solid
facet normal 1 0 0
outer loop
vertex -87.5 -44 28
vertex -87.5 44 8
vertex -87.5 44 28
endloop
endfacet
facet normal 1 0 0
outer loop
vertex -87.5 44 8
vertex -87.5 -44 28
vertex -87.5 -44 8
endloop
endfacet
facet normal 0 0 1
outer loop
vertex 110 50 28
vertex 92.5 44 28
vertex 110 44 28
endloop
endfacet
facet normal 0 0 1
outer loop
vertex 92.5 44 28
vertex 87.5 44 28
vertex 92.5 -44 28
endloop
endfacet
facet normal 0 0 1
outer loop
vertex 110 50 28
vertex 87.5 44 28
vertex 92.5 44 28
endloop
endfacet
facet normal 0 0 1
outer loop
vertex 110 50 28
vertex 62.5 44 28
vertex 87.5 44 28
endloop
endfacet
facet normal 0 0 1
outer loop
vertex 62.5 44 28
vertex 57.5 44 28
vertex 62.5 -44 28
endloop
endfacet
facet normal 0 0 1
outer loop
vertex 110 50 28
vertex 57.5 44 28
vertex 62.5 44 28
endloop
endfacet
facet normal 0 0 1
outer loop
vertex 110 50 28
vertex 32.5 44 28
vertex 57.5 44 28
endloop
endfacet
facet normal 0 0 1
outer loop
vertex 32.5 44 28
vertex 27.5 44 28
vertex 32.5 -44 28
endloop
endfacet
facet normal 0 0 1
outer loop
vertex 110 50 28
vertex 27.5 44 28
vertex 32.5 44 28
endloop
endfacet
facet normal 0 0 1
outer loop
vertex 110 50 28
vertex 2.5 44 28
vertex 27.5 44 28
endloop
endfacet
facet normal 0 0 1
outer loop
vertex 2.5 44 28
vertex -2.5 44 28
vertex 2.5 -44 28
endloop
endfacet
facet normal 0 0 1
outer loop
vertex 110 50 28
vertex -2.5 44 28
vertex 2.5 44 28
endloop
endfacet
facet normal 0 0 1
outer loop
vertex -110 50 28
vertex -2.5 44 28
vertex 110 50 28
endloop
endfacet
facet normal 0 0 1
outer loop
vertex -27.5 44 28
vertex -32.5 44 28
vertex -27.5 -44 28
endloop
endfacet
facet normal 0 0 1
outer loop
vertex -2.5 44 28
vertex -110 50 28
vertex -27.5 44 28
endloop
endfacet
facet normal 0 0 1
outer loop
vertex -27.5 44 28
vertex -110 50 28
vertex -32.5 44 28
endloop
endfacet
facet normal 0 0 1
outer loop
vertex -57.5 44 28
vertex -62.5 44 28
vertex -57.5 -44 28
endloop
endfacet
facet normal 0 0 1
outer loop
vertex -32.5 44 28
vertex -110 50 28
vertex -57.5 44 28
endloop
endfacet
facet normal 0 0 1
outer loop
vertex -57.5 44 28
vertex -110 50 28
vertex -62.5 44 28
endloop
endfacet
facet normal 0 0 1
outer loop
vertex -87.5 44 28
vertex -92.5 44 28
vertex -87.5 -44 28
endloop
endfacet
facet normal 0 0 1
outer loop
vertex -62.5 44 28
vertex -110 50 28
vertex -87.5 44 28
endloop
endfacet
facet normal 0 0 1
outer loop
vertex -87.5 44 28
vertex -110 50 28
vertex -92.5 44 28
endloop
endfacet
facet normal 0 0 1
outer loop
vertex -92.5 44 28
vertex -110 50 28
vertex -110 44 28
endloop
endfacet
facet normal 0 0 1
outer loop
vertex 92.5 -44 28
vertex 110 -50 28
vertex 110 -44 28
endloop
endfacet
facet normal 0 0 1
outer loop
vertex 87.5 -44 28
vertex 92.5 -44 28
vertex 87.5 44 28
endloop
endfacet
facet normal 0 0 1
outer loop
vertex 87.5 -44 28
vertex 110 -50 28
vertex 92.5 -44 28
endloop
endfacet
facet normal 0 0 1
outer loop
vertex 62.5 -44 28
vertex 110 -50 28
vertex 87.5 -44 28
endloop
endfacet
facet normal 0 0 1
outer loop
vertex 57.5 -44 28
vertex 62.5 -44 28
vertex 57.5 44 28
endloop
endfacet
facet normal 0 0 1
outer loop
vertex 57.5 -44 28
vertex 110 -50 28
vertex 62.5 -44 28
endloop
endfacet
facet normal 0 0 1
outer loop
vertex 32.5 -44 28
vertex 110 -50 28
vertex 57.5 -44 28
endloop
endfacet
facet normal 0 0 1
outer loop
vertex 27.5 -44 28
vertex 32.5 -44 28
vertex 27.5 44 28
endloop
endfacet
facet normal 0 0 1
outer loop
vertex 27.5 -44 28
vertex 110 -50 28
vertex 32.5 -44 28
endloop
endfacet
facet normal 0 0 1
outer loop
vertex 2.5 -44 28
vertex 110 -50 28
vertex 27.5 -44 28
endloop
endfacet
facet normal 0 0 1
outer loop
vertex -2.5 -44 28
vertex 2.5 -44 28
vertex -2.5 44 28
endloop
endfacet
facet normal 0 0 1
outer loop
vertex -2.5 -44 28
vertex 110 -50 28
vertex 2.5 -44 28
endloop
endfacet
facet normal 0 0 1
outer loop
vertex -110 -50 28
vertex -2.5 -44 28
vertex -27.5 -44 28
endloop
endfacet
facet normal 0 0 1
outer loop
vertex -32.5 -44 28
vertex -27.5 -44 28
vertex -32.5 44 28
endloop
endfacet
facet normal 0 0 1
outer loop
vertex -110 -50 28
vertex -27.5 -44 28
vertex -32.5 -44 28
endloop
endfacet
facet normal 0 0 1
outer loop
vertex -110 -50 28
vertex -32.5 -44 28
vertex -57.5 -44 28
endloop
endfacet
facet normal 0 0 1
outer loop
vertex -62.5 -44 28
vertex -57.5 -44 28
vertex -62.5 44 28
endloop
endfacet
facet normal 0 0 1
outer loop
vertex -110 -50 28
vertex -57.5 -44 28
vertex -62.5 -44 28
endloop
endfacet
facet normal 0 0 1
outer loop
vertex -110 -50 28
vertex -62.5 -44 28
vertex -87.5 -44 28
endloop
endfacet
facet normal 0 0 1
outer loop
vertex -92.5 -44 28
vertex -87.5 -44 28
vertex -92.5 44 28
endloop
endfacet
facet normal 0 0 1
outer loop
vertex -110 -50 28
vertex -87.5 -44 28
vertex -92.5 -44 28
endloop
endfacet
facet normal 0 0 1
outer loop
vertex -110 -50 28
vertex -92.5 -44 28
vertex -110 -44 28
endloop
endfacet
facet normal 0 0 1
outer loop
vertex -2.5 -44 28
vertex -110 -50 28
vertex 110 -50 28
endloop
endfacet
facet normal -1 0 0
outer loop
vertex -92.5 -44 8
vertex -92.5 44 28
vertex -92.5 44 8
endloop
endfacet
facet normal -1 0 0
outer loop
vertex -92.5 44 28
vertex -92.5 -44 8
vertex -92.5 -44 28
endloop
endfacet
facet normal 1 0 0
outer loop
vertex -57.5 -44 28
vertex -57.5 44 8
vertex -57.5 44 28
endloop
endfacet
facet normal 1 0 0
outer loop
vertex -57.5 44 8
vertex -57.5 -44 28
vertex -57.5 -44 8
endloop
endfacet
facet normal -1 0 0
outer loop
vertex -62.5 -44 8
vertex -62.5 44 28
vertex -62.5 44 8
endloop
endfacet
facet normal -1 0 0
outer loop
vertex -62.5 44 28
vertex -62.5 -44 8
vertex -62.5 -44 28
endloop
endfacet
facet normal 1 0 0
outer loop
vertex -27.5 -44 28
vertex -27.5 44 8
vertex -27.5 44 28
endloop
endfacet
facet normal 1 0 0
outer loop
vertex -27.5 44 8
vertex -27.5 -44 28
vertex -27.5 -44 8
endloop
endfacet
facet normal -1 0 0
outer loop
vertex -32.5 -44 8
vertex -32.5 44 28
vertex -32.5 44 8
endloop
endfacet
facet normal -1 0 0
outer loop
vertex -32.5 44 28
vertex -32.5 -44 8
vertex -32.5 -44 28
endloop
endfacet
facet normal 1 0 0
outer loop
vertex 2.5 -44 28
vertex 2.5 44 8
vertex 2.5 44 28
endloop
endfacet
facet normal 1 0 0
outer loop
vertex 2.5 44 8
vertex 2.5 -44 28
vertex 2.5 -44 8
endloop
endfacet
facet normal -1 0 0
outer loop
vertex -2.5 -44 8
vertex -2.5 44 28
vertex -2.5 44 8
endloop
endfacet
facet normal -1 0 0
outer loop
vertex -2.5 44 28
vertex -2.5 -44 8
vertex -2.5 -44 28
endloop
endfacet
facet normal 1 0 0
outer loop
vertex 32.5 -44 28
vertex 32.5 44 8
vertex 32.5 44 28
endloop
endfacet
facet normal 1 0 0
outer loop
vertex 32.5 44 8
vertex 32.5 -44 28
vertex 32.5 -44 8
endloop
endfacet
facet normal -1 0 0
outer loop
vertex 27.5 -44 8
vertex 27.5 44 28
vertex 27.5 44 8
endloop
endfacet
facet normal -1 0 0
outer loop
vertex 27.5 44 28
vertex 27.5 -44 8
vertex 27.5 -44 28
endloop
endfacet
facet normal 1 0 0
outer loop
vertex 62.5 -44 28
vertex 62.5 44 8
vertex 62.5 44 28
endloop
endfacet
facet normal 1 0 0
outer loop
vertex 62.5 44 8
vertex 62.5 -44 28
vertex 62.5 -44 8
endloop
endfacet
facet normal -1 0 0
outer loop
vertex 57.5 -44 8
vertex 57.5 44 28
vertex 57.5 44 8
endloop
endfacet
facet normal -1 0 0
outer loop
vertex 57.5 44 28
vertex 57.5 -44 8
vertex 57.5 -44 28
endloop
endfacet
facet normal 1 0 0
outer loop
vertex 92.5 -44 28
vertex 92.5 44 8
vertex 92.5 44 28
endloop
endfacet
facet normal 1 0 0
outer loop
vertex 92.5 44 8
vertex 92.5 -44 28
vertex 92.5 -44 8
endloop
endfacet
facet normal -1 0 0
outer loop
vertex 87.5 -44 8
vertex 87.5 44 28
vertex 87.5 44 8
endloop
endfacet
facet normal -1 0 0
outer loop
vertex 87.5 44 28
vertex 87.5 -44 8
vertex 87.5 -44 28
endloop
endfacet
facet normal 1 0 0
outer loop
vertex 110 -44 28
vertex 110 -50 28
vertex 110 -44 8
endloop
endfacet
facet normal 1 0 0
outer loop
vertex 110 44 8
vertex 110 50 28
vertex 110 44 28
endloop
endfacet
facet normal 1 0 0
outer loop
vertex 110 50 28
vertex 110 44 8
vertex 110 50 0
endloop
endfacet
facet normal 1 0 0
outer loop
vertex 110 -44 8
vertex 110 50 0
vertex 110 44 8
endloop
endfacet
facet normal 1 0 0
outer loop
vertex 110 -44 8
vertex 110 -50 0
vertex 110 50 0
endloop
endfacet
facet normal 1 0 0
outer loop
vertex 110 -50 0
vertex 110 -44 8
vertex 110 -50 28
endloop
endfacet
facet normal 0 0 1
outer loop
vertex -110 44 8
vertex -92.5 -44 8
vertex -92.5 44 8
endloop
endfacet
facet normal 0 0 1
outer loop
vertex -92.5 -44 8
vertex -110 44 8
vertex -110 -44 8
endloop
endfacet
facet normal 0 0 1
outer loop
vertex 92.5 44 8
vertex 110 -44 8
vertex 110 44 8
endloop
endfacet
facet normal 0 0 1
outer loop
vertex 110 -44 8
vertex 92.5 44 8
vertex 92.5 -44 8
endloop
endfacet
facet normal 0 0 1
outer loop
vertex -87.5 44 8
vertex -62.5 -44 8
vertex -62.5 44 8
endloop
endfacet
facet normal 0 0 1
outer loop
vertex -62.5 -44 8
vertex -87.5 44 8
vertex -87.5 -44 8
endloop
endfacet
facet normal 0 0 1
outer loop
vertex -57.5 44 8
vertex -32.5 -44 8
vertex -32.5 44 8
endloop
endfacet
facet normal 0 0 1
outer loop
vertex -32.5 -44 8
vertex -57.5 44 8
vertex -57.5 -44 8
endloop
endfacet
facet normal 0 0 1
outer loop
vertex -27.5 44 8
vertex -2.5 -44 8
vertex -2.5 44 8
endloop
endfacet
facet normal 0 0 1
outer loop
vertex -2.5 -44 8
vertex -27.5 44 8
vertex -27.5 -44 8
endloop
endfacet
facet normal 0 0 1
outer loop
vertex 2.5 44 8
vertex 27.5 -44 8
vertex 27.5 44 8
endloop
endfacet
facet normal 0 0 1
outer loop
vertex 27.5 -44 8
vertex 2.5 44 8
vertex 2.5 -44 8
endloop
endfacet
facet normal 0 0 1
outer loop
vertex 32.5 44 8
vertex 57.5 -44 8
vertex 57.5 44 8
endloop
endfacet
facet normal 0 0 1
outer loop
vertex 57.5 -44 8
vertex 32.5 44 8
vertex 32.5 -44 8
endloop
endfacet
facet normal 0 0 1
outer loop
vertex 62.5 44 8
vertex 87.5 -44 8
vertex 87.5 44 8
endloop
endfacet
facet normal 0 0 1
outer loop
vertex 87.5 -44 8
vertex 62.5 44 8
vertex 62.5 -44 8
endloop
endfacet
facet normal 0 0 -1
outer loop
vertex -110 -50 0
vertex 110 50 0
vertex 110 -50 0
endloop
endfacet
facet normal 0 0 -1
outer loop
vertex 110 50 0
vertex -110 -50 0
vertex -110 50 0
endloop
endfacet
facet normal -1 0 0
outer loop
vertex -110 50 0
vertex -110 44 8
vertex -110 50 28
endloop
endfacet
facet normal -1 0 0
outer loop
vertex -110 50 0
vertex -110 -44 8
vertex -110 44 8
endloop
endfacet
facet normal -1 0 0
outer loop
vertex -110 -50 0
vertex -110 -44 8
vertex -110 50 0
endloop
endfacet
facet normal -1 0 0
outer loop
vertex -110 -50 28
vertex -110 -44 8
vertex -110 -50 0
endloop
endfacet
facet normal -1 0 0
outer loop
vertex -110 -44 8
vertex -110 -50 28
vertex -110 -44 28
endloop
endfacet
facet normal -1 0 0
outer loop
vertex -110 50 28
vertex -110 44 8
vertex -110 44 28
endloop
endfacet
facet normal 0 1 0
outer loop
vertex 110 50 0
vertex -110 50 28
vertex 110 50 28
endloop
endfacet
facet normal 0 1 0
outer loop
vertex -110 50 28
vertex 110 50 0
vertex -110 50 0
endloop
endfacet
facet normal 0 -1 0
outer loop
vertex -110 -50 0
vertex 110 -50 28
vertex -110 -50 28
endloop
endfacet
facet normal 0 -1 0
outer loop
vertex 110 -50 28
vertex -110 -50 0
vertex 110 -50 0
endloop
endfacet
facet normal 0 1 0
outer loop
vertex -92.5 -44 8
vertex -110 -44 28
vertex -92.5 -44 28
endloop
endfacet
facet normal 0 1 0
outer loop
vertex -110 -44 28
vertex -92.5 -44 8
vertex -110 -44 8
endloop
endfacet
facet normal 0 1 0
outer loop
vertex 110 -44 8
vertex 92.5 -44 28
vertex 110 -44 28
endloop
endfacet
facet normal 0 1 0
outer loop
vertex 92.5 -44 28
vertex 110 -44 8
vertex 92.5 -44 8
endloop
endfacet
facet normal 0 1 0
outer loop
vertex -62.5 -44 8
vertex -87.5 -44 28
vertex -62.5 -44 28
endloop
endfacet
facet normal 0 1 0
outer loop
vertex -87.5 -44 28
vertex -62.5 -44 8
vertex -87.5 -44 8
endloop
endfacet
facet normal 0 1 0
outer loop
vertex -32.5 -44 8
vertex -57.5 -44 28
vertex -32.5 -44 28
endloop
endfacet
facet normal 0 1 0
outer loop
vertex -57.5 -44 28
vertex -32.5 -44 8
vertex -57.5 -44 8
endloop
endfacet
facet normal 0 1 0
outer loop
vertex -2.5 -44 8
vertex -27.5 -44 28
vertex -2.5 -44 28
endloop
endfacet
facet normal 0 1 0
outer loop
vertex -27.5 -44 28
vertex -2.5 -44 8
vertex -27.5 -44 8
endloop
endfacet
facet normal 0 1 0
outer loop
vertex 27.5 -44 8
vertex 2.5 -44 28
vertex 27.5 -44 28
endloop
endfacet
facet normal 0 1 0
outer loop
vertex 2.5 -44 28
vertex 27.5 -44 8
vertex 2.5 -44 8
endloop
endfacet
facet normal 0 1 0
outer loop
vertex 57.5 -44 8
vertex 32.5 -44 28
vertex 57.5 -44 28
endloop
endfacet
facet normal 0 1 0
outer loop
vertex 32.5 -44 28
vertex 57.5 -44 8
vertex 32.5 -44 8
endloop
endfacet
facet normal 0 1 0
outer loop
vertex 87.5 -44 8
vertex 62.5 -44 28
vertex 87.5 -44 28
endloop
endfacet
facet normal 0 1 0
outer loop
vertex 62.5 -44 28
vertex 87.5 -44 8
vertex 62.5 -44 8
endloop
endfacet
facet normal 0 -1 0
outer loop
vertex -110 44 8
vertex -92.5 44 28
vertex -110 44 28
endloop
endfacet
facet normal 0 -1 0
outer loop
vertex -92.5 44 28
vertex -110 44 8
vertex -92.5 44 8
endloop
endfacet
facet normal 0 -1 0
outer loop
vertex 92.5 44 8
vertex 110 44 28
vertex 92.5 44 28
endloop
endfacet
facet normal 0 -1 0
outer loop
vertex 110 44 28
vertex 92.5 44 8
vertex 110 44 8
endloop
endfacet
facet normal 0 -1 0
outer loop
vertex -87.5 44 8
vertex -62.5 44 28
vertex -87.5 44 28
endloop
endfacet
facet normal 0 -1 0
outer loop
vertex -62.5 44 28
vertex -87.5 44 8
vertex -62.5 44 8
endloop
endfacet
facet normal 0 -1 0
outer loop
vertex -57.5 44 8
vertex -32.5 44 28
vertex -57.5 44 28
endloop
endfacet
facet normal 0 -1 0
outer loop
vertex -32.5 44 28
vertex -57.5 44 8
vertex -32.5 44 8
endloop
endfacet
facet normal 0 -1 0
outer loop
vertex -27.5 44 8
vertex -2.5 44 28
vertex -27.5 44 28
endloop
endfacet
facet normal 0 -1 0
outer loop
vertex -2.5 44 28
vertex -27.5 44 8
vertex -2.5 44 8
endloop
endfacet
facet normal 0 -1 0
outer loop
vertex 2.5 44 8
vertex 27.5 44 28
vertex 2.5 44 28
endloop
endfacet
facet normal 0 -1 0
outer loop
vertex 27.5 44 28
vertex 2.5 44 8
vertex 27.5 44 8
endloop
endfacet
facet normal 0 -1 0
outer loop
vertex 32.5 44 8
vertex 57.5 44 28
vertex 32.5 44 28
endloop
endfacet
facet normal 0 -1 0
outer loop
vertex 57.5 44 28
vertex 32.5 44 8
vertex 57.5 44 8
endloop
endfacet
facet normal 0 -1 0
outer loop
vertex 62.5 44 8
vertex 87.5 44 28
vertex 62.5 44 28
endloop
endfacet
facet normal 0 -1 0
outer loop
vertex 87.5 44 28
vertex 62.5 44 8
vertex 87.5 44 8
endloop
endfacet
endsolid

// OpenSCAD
$fn = 32;

// ----------------------------------------------------------------------
// Rib frame 220 x 100 x 28
// 7 ribs at 30 mm pitch
// ----------------------------------------------------------------------

// --- parameters (mm) ---
frame = [220, 100, 8];  // base plate size (x, y, z)
rail_w = 6;             // side rail width
ribs = 7;               // number of ribs
rib_t = 5;              // rib thickness
rib_h = 20;             // rib height above the base plate
pitch = 30;             // pitch between rib centres

// --- derived feature positions (mm) ---
span = (ribs - 1) * pitch;          // = 180   distance between the outer ribs
origin_x = -span / 2;               // = -90   X of the first rib
rib_len = frame[1] - 2 * rail_w + 2;  // = 90   rib length, 1 mm into each rail
feature_centers = [
  [origin_x + 0 * pitch, 0],
  [origin_x + 1 * pitch, 0],
  [origin_x + 2 * pitch, 0],
  [origin_x + 3 * pitch, 0],
  [origin_x + 4 * pitch, 0],
  [origin_x + 5 * pitch, 0],
  [origin_x + 6 * pitch, 0]
];   // rib centre line, drives the rib loop

// base plate, two side rails, then the ribs read straight off feature_centers
union() {
  translate([-frame[0] / 2, -frame[1] / 2, 0]) cube(frame);
  translate([-frame[0] / 2, -frame[1] / 2, 0]) cube([frame[0], rail_w, frame[2] + rib_h]);
  translate([-frame[0] / 2, frame[1] / 2 - rail_w, 0]) cube([frame[0], rail_w, frame[2] + rib_h]);
  for (centre = feature_centers)
    translate([centre[0] - rib_t / 2, centre[1] - rib_len / 2, frame[2] - 1])
      cube([rib_t, rib_len, rib_h + 1]);
}
